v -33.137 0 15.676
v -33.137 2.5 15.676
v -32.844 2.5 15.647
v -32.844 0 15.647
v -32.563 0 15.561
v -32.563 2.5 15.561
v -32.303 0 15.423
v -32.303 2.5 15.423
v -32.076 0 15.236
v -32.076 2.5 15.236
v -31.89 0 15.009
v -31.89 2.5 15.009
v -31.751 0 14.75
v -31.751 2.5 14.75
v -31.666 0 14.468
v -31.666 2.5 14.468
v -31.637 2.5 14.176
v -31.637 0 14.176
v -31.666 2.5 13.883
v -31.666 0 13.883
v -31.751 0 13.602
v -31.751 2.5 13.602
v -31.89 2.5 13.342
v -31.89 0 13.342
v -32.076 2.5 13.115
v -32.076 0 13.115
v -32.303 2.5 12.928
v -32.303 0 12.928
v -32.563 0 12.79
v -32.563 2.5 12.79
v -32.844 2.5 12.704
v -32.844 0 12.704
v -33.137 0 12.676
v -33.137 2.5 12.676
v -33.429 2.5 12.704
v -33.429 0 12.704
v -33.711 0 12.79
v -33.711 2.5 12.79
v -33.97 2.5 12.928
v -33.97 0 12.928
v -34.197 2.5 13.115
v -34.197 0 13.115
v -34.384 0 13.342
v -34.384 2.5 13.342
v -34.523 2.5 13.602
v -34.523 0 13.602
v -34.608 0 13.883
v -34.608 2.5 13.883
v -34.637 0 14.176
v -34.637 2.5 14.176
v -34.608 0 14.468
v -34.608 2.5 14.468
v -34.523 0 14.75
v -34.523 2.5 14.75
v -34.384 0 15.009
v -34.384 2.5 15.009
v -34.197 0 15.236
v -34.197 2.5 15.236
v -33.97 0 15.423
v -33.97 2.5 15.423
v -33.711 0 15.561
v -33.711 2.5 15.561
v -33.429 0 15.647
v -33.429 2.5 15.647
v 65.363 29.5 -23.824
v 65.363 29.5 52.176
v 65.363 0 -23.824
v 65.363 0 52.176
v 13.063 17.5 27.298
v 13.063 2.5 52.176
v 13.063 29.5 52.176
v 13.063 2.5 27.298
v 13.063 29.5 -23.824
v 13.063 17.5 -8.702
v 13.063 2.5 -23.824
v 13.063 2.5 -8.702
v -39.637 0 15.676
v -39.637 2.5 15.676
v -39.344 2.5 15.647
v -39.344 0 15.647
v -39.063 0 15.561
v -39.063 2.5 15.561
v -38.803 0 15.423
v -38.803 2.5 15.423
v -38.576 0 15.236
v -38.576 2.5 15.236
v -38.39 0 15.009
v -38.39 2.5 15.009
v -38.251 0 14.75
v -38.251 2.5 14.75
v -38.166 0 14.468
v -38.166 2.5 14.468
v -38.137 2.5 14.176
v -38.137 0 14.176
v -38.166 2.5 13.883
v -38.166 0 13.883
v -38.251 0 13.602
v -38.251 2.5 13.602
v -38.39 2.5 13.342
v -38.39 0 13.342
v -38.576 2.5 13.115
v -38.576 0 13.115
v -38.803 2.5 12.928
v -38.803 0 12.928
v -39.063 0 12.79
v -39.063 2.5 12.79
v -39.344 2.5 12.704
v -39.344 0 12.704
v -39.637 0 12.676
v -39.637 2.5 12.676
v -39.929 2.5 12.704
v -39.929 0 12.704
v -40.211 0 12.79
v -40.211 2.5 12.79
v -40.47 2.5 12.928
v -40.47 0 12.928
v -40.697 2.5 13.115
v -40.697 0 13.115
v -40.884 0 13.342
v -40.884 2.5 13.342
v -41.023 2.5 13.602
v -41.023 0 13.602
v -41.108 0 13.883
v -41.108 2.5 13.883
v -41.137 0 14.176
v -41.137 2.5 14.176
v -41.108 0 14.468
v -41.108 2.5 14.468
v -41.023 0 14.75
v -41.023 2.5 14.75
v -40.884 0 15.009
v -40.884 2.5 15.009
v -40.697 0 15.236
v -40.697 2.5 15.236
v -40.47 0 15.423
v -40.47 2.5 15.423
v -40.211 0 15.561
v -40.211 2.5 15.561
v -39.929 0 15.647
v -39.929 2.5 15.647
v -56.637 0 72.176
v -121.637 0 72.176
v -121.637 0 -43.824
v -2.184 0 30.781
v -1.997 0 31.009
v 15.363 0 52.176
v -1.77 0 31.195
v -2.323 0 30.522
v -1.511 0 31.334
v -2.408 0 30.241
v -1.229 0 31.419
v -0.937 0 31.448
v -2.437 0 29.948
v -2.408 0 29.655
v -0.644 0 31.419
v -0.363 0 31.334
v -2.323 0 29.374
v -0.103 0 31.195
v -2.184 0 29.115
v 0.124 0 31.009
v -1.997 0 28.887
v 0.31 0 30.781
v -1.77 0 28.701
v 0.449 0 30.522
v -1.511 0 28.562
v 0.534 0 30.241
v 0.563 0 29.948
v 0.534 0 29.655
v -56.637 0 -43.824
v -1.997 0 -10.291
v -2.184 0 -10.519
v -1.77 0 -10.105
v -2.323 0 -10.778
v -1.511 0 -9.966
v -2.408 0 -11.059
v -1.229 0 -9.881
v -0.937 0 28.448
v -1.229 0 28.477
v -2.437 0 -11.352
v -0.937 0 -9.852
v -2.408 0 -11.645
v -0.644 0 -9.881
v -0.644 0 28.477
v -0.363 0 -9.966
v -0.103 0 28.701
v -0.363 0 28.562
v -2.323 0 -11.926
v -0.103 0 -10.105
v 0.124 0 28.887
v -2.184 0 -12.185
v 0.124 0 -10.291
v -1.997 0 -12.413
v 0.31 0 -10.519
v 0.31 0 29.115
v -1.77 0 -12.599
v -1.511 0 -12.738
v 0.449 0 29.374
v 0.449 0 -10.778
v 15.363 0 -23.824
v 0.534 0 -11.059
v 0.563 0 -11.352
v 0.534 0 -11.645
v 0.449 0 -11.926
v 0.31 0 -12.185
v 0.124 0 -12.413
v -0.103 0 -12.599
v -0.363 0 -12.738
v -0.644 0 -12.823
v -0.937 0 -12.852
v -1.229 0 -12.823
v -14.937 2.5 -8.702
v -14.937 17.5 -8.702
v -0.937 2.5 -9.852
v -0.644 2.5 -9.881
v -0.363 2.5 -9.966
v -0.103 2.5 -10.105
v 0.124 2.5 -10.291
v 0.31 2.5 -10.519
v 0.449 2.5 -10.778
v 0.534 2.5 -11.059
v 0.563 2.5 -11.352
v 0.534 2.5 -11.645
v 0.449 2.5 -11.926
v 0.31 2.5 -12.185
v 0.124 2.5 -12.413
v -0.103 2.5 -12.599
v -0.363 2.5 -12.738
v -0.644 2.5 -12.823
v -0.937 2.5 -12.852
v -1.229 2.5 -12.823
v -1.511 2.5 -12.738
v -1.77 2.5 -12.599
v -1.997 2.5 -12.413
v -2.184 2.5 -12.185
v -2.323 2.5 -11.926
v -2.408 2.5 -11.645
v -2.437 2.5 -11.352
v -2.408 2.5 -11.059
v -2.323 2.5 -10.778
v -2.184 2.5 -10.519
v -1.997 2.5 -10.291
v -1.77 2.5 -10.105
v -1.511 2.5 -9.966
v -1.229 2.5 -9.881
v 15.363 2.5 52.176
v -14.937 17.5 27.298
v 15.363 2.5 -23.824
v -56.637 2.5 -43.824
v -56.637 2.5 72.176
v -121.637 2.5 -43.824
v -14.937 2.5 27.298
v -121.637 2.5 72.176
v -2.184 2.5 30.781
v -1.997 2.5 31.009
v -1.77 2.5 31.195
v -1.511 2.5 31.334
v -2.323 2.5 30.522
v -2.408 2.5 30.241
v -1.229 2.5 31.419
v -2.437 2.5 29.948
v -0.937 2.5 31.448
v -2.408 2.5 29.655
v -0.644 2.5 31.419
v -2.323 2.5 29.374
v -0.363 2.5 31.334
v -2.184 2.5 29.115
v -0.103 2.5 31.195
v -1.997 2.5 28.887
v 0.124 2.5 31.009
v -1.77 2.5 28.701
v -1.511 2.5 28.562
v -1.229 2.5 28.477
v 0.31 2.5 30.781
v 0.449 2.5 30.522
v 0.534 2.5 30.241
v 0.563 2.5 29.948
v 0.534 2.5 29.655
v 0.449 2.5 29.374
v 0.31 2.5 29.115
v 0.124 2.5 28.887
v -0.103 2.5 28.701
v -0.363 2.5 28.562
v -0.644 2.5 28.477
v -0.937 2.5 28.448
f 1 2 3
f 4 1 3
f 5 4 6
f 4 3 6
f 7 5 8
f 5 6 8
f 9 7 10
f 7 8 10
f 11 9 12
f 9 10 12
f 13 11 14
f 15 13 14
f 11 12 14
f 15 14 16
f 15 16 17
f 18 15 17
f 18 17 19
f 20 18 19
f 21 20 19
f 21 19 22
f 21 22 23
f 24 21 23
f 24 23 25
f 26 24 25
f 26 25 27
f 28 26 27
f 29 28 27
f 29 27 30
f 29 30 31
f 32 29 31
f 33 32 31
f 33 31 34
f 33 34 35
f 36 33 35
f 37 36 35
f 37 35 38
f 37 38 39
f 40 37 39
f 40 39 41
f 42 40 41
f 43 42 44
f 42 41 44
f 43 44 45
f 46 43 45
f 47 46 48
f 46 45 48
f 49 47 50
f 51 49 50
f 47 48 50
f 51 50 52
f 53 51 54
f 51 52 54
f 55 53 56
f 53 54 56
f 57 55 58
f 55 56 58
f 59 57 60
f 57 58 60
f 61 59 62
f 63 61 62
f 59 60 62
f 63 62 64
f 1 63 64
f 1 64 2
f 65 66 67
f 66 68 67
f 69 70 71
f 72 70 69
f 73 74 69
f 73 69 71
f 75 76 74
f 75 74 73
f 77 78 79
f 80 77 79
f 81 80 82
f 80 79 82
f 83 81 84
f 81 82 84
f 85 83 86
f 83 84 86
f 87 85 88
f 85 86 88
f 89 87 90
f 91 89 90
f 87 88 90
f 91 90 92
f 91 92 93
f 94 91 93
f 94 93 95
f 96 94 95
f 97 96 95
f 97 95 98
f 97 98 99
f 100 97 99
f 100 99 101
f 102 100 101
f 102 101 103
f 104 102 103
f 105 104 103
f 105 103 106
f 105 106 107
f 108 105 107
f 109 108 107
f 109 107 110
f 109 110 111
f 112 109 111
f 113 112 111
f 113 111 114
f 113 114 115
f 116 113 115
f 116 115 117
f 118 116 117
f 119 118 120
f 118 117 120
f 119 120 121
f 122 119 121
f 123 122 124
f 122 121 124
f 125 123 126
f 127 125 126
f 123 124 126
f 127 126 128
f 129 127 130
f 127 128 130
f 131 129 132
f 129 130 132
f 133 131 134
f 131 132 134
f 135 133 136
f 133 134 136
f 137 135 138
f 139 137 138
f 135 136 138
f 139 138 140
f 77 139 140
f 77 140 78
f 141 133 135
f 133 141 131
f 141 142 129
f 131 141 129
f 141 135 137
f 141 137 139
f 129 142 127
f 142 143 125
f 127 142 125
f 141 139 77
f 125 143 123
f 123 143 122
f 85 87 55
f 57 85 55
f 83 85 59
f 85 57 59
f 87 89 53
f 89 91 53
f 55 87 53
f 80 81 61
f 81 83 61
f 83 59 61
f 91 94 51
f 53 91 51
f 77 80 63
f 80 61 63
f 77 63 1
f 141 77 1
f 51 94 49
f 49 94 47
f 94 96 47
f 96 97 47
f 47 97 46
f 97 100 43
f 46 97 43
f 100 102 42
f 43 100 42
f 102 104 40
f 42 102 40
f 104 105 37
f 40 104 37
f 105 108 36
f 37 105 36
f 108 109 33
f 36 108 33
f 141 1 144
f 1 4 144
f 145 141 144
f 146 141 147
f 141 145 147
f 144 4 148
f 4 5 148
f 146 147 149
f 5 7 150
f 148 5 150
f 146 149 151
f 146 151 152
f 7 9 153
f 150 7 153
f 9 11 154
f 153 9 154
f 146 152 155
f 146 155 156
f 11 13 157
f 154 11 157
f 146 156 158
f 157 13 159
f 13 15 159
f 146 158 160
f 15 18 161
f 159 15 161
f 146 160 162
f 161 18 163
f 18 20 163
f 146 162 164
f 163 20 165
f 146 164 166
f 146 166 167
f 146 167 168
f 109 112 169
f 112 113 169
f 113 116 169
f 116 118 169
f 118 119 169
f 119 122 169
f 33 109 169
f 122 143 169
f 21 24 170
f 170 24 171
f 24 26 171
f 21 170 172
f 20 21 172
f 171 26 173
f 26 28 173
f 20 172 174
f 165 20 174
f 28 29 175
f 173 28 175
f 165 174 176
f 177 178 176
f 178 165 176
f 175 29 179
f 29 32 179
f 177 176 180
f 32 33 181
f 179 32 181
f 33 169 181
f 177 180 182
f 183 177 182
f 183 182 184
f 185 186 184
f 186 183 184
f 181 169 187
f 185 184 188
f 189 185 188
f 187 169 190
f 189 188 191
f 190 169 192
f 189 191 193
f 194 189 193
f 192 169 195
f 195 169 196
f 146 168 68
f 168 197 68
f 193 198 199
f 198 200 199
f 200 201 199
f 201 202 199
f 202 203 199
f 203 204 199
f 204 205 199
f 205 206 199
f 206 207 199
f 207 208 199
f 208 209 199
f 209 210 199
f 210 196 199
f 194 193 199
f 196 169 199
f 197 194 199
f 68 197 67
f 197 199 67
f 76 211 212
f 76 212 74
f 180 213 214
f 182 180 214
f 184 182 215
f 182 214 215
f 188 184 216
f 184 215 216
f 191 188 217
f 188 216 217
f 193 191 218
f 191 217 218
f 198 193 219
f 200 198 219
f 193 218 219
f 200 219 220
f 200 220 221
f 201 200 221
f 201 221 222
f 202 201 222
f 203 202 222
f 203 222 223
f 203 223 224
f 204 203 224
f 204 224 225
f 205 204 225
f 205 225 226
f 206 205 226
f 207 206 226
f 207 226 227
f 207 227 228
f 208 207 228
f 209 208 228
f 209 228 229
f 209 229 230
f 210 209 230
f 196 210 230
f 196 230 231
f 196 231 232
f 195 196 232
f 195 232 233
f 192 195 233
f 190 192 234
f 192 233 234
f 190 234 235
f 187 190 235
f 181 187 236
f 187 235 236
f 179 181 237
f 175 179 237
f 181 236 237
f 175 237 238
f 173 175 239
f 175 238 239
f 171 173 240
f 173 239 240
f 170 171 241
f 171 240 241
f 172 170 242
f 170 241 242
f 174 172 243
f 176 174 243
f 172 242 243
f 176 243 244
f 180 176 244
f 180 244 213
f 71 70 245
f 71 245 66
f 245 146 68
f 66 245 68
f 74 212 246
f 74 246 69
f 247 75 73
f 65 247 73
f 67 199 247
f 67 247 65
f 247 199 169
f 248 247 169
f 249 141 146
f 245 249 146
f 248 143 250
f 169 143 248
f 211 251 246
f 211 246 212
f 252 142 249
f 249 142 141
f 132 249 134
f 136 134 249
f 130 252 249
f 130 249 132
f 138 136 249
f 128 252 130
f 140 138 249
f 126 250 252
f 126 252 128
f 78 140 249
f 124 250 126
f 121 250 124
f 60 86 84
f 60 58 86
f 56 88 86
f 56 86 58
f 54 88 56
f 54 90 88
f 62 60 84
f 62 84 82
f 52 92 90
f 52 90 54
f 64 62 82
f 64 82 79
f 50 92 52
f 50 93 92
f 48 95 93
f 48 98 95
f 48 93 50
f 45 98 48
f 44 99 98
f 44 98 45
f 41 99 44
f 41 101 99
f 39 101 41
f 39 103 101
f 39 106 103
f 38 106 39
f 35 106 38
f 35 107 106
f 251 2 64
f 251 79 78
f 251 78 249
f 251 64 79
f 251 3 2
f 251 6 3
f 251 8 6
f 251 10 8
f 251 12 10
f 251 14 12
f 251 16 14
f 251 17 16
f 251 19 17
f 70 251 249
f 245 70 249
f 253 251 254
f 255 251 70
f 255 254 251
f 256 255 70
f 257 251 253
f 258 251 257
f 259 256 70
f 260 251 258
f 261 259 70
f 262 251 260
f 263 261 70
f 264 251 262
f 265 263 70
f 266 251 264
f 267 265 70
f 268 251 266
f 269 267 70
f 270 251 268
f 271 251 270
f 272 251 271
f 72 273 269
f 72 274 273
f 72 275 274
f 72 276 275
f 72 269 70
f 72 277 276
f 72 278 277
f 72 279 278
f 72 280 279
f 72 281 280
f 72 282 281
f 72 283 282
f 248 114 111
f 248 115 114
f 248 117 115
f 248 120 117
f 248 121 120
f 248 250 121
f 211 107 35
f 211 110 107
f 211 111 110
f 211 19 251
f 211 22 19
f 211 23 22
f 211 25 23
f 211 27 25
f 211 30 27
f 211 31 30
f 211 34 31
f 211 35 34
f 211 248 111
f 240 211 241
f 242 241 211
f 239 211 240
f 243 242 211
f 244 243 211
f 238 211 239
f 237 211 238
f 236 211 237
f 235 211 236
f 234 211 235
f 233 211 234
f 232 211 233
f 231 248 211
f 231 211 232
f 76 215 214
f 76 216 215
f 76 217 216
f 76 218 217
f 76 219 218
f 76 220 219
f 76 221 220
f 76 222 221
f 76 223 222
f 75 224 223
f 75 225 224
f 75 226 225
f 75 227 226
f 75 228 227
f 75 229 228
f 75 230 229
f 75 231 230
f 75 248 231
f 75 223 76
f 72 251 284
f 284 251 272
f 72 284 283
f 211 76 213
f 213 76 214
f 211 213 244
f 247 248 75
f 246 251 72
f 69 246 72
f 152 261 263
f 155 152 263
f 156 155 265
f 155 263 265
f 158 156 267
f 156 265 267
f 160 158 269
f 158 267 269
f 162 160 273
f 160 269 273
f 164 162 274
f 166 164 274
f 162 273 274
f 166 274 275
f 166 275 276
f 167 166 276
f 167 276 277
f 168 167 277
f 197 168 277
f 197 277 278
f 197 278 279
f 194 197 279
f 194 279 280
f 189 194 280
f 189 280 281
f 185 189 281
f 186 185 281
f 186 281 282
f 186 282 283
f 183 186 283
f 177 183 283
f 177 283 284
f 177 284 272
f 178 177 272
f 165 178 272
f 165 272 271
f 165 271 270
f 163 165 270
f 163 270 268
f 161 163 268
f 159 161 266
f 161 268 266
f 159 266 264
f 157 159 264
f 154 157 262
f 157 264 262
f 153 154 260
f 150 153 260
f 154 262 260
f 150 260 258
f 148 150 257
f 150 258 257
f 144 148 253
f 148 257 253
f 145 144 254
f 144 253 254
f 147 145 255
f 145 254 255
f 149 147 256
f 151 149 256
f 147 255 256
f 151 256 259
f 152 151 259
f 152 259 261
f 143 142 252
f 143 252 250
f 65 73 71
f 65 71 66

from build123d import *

# Parameters (mm, degrees)
BOSS_EXTRUDE1_DEPTH = 2.5
SKETCH2_R           = 1.5
CUT_EXTRUDE1_DEPTH  = 142.460566572
SKETCH3_R           = 1.5
CUT_EXTRUDE2_DEPTH  = 142.460566572
BOSS_EXTRUDE2_DEPTH = 15
SKETCH5_W           = 52.3
SKETCH5_H           = 76
BOSS_EXTRUDE3_DEPTH = 27


with BuildPart() as part:
    # Sketch1 → Boss-Extrude1 (new body)
    with BuildSketch(Plane(origin=(0, 0, 0), x_dir=(1, 0, 0), z_dir=(0, 1, 0))):
        Polygon((15.363173147, 23.82435142), (-56.636826853, 43.82435142), (-121.636826853, 43.82435142), (-121.636826853, -72.17564858), (-56.636826853, -72.17564858), (15.363173147, -52.17564858), (65.363173147, -52.17564858), (65.363173147, 23.82435142), align=None)
    extrude(amount=BOSS_EXTRUDE1_DEPTH)

    # Sketch2 → Cut-Extrude1 (cut, through all)
    with BuildSketch(Plane(origin=(0, 2.5, 0), x_dir=(1, 0, 0), z_dir=(0, 1, 0))):
        with Locations((-39.636826853, -14.17564858)):
            Circle(SKETCH2_R)
        with Locations((-33.136826853, -14.17564858)):
            Circle(SKETCH2_R)
    extrude(amount=-CUT_EXTRUDE1_DEPTH, mode=Mode.SUBTRACT)

    # Sketch3 → Cut-Extrude2 (cut, through all)
    with BuildSketch(Plane(origin=(0, 2.5, 0), x_dir=(1, 0, 0), z_dir=(0, 1, 0))):
        with Locations((-0.936826853, 11.352129198)):
            Circle(SKETCH3_R)
        with Locations((-0.936826853, -29.947870802)):
            Circle(SKETCH3_R)
    extrude(amount=-CUT_EXTRUDE2_DEPTH, mode=Mode.SUBTRACT)

    # Sketch4 → Boss-Extrude2 (add)
    with BuildSketch(Plane(origin=(0, 2.5, 0), x_dir=(1, 0, 0), z_dir=(0, 1, 0))):
        Polygon((-0.936826853, 8.702129198), (-14.936826853, 8.702129198), (-14.936826853, -27.297870802), (-0.936826853, -27.297870802), (13.063173147, -27.297870802), (13.063173147, 8.702129198), align=None)
    extrude(amount=BOSS_EXTRUDE2_DEPTH)

    # Sketch5 → Boss-Extrude3 (add)
    with BuildSketch(Plane(origin=(0, 2.5, 0), x_dir=(1, 0, 0), z_dir=(0, 1, 0))):
        with Locations((39.213173147, -14.17564858)):
            Rectangle(SKETCH5_W, SKETCH5_H)
    extrude(amount=BOSS_EXTRUDE3_DEPTH)


solid = part.part
